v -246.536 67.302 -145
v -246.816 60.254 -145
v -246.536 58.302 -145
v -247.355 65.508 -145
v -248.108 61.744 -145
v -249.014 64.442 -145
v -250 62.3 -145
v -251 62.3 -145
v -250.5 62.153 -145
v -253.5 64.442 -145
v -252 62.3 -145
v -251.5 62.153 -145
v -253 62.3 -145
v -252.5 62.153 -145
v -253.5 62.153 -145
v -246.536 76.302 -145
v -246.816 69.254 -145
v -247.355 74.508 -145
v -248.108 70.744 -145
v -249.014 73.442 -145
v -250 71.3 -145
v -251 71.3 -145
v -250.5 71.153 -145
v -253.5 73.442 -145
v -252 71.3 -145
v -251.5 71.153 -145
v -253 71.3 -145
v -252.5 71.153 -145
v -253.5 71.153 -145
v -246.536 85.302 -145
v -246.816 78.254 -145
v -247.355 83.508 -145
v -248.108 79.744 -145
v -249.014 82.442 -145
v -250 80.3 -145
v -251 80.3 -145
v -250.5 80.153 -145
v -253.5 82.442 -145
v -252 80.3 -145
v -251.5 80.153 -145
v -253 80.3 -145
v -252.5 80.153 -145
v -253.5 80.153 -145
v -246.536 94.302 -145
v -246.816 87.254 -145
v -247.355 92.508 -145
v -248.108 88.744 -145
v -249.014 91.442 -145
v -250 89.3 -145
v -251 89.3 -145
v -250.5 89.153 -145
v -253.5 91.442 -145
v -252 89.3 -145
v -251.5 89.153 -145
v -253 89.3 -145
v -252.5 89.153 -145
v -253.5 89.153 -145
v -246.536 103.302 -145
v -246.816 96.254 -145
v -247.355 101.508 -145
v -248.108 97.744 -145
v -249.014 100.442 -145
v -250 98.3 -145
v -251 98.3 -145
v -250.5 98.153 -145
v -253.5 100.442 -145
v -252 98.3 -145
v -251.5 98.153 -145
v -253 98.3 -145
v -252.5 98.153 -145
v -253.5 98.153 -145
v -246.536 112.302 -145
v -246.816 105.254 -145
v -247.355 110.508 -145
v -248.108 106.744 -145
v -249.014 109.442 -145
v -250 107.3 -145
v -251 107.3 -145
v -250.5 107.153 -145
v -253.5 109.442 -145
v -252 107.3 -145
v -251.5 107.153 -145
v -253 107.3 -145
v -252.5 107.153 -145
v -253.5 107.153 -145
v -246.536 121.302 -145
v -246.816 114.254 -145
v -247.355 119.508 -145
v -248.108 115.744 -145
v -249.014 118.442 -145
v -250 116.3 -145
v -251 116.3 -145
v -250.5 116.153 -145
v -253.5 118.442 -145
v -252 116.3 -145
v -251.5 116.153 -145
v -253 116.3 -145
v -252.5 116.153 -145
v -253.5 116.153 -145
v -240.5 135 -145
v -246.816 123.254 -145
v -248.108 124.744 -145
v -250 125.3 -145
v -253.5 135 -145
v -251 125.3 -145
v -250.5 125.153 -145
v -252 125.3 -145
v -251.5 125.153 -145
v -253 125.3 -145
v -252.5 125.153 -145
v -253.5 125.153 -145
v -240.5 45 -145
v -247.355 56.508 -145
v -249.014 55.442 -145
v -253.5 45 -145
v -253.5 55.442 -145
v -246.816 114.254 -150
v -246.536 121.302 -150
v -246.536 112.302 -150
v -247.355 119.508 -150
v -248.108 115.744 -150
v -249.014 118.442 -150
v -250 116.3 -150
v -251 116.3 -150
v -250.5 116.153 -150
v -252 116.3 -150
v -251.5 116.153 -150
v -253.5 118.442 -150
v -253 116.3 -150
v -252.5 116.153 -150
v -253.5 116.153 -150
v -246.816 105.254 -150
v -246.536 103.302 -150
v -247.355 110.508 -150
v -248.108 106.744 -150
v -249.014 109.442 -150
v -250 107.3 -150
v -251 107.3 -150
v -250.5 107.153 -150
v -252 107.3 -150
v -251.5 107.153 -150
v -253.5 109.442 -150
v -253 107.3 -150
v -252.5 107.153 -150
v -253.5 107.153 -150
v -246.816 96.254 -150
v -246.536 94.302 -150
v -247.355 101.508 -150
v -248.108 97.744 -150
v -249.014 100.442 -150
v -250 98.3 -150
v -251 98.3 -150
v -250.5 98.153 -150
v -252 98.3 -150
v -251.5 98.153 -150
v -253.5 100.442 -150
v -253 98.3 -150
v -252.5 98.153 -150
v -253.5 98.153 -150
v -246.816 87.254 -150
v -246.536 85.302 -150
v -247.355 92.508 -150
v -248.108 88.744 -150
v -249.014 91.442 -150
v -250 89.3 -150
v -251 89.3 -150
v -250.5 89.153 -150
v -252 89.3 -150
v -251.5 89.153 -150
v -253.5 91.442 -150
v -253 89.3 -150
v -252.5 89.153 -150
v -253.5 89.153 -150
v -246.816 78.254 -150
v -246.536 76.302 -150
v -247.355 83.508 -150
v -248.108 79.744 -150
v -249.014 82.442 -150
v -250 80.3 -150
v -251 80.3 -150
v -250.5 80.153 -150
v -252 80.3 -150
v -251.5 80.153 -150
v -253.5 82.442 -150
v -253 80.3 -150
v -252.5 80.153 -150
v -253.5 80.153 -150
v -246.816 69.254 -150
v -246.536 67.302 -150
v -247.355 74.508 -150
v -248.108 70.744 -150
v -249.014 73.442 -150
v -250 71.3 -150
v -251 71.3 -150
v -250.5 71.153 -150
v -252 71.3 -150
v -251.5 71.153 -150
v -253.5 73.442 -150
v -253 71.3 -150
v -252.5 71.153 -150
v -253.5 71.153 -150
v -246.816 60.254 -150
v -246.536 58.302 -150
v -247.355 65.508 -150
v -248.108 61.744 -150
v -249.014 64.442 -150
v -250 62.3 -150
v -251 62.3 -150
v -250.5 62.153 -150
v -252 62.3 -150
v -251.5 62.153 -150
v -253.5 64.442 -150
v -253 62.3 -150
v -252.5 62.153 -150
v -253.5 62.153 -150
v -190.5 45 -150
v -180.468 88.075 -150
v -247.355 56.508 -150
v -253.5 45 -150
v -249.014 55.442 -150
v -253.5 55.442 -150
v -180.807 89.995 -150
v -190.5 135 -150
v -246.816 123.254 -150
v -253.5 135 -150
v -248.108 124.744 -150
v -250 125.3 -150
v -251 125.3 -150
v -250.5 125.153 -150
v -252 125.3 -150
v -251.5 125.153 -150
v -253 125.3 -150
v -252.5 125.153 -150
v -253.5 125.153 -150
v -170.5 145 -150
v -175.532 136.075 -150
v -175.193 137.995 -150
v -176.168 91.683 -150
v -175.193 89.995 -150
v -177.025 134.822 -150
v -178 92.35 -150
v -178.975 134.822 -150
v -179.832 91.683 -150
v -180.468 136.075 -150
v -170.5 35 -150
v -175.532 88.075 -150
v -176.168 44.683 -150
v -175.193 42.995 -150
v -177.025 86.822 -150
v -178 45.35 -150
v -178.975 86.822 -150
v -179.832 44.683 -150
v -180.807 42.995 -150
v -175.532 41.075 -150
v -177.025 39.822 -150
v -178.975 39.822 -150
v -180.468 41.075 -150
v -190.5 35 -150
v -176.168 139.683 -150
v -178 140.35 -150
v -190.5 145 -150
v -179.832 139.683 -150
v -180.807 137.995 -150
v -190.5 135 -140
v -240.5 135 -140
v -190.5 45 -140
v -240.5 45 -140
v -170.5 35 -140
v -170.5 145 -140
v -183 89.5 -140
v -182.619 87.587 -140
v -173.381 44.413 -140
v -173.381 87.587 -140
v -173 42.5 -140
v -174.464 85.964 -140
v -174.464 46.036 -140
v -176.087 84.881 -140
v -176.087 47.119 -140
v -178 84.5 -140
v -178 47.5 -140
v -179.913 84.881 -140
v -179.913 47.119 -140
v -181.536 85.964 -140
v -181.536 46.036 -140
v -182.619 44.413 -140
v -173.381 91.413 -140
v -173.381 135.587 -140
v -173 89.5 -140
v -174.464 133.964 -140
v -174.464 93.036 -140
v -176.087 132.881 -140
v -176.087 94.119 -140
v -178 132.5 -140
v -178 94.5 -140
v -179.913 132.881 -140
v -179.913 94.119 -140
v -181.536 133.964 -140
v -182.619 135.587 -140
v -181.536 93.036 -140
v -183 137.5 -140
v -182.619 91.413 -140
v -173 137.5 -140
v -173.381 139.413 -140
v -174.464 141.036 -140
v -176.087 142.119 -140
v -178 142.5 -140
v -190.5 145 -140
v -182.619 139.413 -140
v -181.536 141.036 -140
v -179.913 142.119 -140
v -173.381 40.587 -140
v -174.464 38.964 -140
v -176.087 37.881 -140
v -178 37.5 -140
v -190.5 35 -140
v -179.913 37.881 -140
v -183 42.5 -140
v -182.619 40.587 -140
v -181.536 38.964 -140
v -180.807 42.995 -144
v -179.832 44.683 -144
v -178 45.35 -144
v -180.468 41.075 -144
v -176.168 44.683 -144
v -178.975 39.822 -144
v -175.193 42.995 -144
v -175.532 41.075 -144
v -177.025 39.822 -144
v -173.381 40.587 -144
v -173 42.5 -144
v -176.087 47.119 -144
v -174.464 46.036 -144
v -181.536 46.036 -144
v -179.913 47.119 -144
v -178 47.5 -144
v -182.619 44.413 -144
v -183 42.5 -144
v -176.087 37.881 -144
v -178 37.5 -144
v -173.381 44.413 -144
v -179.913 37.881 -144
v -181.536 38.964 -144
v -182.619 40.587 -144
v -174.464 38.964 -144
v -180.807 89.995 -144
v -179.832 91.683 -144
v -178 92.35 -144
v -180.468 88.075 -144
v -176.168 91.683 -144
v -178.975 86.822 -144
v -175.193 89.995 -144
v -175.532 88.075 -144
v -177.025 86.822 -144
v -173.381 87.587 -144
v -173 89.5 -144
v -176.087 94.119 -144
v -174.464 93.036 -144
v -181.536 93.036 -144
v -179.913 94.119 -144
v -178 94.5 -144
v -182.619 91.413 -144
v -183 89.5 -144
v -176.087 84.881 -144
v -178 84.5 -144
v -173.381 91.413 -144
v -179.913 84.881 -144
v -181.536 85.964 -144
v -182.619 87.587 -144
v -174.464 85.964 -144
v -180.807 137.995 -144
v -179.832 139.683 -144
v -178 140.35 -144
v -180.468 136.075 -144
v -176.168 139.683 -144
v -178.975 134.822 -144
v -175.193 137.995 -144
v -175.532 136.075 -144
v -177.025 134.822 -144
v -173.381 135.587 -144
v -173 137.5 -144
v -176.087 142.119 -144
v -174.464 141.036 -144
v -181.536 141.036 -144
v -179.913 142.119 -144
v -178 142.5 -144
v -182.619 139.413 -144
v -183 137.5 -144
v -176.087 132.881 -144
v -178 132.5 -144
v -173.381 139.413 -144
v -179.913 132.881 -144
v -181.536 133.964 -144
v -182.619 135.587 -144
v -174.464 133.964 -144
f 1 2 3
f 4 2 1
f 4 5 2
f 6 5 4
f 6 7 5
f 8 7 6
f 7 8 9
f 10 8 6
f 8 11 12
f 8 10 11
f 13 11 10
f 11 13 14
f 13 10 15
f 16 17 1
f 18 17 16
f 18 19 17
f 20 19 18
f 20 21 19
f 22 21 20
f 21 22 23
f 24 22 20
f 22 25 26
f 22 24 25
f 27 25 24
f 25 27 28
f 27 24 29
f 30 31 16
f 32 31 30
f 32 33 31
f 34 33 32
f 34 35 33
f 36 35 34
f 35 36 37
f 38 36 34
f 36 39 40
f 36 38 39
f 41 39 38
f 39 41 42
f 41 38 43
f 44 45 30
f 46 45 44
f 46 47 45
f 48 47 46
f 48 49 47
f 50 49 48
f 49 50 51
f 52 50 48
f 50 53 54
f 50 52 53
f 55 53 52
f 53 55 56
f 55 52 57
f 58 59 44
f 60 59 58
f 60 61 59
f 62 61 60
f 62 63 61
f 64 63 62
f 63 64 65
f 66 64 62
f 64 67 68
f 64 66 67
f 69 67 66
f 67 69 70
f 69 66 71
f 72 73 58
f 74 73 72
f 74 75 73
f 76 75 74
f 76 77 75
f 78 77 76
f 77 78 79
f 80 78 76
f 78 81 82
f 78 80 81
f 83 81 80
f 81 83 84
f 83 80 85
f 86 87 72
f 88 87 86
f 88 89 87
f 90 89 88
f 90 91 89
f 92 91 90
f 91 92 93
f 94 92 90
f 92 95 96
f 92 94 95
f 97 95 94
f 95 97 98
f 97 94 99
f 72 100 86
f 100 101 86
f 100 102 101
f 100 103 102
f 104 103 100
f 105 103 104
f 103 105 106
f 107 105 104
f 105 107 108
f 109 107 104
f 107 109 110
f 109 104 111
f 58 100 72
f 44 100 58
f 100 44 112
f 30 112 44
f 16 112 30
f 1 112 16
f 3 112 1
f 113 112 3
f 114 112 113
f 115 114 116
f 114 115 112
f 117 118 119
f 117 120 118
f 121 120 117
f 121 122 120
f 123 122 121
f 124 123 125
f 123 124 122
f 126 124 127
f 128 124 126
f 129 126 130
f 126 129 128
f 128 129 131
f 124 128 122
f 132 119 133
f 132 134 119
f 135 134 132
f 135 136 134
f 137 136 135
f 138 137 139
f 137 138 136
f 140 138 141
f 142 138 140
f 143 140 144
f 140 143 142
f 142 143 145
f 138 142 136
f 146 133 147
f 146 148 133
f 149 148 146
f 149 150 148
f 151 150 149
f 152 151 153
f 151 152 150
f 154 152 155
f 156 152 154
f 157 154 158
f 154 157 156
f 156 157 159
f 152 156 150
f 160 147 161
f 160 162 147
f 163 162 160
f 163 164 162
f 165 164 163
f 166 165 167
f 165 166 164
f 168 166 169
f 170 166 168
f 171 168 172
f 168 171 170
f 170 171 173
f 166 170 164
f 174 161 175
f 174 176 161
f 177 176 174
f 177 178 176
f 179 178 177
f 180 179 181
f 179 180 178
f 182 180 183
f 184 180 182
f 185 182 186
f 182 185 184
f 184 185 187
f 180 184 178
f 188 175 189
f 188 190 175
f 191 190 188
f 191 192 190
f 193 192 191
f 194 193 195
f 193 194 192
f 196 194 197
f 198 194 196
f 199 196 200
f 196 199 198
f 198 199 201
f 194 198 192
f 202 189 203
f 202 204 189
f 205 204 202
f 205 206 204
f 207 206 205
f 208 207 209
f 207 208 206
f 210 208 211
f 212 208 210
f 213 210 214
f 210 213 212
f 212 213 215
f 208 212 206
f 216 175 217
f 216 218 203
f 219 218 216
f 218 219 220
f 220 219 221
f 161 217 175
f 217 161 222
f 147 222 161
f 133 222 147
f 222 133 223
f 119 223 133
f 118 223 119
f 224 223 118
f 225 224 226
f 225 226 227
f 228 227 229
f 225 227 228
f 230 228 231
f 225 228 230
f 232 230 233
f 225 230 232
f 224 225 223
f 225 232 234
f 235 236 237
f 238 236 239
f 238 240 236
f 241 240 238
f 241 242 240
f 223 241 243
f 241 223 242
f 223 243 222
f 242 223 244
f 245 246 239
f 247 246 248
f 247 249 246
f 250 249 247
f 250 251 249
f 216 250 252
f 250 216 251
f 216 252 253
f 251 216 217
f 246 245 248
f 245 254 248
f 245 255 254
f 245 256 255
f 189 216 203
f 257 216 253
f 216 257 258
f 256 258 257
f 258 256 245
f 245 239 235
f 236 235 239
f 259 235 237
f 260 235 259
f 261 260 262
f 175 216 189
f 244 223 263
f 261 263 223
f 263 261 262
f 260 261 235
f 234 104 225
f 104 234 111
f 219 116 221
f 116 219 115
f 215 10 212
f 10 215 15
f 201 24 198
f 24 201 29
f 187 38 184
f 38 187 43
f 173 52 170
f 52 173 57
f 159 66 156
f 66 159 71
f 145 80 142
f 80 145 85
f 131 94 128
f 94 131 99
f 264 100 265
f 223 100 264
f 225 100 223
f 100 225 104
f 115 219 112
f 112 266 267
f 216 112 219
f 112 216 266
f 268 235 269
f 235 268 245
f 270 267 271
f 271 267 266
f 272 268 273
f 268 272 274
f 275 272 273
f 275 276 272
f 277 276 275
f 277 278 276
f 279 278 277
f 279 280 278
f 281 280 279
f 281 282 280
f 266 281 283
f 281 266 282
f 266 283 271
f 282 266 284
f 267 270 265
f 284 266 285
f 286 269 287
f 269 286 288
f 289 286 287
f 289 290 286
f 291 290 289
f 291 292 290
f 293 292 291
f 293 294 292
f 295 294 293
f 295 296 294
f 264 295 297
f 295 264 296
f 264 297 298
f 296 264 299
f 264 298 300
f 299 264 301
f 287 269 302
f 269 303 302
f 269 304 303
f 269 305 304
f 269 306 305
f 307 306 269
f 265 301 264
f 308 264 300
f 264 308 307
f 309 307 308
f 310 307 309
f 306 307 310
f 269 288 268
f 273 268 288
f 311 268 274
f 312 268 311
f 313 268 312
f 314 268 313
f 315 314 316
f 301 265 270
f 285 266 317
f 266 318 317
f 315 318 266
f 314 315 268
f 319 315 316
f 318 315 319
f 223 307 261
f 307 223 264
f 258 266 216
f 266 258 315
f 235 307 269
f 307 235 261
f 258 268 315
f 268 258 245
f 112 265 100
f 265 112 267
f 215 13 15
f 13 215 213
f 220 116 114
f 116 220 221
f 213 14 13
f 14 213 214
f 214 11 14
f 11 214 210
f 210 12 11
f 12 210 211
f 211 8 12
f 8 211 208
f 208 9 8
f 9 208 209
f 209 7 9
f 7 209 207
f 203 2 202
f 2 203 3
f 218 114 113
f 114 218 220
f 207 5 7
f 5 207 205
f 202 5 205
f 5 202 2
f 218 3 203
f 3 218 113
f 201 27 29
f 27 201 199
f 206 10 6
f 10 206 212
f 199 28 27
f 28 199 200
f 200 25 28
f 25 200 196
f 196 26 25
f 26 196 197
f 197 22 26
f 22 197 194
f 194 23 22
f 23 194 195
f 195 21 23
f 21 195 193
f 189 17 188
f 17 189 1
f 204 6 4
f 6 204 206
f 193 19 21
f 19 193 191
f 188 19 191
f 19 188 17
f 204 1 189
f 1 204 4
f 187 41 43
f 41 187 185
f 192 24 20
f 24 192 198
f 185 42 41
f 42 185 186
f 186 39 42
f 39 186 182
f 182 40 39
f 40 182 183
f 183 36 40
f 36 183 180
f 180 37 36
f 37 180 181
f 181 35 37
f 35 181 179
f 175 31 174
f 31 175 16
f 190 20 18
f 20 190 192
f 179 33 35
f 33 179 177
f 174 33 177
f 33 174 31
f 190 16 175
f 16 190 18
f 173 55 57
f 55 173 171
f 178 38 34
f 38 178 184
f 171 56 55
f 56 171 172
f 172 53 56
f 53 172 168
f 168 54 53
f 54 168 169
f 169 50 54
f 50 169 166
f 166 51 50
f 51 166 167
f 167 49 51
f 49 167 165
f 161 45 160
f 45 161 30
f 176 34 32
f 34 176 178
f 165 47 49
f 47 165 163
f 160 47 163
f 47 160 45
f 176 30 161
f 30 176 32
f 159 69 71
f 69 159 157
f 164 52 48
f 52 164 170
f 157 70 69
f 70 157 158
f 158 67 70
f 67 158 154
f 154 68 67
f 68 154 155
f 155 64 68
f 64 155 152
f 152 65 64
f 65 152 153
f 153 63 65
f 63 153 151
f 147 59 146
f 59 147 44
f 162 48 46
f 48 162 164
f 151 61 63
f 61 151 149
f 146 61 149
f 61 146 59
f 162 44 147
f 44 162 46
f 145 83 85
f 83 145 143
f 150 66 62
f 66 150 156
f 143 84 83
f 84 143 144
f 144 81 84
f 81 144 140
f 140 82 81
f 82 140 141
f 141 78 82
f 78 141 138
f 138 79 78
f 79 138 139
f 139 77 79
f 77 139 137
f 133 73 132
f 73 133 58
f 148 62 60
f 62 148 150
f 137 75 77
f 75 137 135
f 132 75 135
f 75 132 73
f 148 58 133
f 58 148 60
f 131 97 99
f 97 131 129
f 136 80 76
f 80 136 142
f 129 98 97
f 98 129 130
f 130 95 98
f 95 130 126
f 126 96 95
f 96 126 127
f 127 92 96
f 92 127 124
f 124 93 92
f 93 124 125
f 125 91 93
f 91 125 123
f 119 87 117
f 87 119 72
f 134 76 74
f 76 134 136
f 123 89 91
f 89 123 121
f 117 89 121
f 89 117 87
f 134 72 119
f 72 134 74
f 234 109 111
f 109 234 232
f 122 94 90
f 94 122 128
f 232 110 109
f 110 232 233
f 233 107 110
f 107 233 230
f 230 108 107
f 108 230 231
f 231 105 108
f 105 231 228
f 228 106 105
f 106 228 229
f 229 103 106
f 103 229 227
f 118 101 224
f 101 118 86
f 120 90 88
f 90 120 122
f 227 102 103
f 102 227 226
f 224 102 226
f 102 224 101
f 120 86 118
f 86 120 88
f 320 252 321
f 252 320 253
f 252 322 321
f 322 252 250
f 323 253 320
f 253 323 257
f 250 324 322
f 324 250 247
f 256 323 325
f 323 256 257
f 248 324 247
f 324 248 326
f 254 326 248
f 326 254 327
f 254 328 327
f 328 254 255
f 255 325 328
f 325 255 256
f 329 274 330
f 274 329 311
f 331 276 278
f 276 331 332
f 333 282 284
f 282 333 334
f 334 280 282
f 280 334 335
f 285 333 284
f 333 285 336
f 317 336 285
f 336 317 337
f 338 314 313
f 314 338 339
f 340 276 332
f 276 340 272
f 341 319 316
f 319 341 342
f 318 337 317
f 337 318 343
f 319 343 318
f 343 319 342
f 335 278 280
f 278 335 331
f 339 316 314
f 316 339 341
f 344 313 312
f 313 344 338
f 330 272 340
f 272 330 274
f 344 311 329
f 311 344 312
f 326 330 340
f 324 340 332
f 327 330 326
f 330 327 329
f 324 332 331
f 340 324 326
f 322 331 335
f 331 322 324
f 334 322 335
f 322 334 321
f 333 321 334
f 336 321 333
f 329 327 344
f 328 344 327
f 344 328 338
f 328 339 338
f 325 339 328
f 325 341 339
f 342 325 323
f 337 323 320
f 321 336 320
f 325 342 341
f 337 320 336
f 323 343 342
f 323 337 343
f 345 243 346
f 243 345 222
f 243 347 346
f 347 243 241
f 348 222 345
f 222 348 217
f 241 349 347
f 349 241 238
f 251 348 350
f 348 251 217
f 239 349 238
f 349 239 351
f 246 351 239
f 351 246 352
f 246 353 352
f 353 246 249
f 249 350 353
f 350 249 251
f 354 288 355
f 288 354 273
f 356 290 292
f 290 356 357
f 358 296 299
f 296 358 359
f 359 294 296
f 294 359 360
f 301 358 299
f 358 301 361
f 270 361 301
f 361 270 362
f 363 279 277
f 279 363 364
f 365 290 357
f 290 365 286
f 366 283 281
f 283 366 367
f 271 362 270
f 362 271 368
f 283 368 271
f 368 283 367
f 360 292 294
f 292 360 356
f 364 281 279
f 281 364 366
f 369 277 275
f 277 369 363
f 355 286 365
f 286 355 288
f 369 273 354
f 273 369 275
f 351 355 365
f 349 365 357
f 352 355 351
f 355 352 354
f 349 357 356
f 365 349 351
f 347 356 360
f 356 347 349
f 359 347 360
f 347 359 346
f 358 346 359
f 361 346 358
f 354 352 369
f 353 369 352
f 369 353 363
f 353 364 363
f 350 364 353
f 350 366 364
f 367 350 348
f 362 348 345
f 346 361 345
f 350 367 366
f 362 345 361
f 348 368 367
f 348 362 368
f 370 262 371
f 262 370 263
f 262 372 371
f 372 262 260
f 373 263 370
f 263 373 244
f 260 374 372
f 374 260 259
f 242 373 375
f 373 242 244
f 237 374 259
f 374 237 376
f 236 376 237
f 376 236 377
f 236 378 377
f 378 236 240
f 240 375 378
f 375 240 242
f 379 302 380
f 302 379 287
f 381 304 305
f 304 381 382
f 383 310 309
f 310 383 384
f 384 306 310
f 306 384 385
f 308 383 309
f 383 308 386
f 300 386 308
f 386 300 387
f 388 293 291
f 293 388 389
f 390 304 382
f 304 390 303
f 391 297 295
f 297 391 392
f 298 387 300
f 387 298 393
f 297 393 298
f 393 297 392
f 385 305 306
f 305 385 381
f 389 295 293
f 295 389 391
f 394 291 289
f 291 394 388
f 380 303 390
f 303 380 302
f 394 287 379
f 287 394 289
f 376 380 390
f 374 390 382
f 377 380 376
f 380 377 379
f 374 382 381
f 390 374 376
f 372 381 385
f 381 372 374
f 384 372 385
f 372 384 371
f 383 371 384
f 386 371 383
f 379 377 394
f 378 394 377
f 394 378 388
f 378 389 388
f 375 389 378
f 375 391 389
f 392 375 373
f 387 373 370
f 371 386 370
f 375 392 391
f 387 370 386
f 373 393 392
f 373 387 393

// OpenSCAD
multichannel_drypad_longer();

module multichannel_drypad_longer(){
translate([-148,85,-150])difference(){
union(){
translate([-75.5-5+22-5-34+12-20,-40,0])cube([29+36-12+20,90,5]);
translate([-75.5-5+45-7,-40-10,0])cube([20,90+20,5+5]);
translate([-75.5-5+45-7-20-10-20,-40-10-10+20,0])cube([30+20,90,5+5]);
}
/*
translate([-30,33,-10]){
cylinder(r=3.7/2,h=30);translate([0,0,10])
cylinder(r=6.7/2,h=3.2);
}
translate([-30,33-66,-10]){
cylinder(r=3.7/2,h=30);
translate([0,0,10])cylinder(r=6.7/2,h=3.2);
}
*/
/*
translate([-30,0,0])for(a=[0:1]){
translate([-44-(a*10),-40+5,-1])cube([5,71+10,13]);
}
*/
//translate([-30-30+6,-20,-20])
//translate([-44-(a*10),-40+5,-1])cylinder(r=6/2,h=50);
//translate([-30-30+6,20,-20])
//translate([-44-(a*10),-40+5,-1])cylinder(r=6/2,h=50);
translate([-33,-66,-20])rotate([0,0,90]){
//actually c-to-c spacing on prusa is 8.723 not 9mm
translate([0,-31+65-12+20,0])
for(j=[0:7]){
for(k=[0:3]){
 //The is for the Rainin LTS tip without the filter
 //translate([19+7+(j*9)+5+2,2.5-10+33-(k*1),2])translate([7,25/2-8,-0.1])cylinder(r=7.8/2,h=40);
 //The is for the Rainin LTS tip with this is too tight
 //translate([19+7+(j*9)+5+2,2.5-10+33-(k*1),2])translate([6.5,25/2-8,-0.1])cylinder(r=6.5/2,h=40);
 #translate([19+7+(j*9)+5+2,2.5-10+33-(k*1),2])translate([6.8,25/2-8,-0.1])cylinder(r=7/2,h=40);
}
}

/*
translate([19+7,2.5-10,2])translate([7.5,25/2-8,18])cylinder(r=6.9/2,h=3.2);
translate([19+7,2.5-10,2])translate([7.5,25/2-8,-0.1])cylinder(r=3.7/2,h=40);
translate([19+7+37,2.5-10,2])translate([7.5,25/2-8,18])cylinder(r=6.9/2,h=3.2);
translate([19+7+37,2.5-10,2])translate([7.5,25/2-8,-0.1])cylinder(r=3.7/2,h=40);
translate([19+7+75,2.5-10,2])translate([7.5,25/2-8,18])cylinder(r=6.9/2,h=3.2);
translate([19+7+75,2.5-10,2])translate([7.5,25/2-8,-0.1])cylinder(r=3.7/2,h=40);
*/
//translate([19+7,2.5-10,2])translate([7.5,25/2-8,18])cylinder(r=6.9/2,h=3.2);
translate([19+7,2.5-10,2])translate([7.5-10,25/2-8,14])cylinder(r=5.7/2,h=240);
translate([19+7,2.5-10,2])translate([7.5-10,25/2-8,24])cylinder(r=10/2,h=240);
//translate([19+7+37,2.5-10,2])translate([7.5,25/2-8,18])cylinder(r=6.9/2,h=3.2);
translate([19+7+37,2.5-10,2])translate([7.5,25/2-8,14])cylinder(r=5.7/2,h=40);
translate([19+7+37,2.5-10,2])translate([7.5,25/2-8,24])cylinder(r=10/2,h=40);
//translate([19+7+75,2.5-10,2])translate([7.5,25/2-8,18])cylinder(r=6.9/2,h=3.2);
#translate([19+7+75,2.5-10,2])translate([7.5+10,25/2-8,14])cylinder(r=5.7/2,h=240);
#translate([19+7+75,2.5-10,2])translate([7.5+10,25/2-8,24])cylinder(r=10/2,h=240);
}
}
}
